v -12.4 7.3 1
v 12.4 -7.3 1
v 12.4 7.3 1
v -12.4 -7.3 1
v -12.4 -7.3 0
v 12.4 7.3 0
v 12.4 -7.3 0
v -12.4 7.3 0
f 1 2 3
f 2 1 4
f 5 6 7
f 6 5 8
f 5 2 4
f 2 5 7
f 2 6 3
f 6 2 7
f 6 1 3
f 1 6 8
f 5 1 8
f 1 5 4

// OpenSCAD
$fn = 64;

// Target PCB dimensions (mm)
pcb_length    = 24.8;
pcb_width     = 14.6;
pcb_thickness = 1.0;

// One connected solid: simple rectangular PCB.
// Centered in X/Y, with bottom face on Z=0.
module pcb(len, wid, thk) {
    translate([0, 0, thk/2])
        cube([len, wid, thk], center=true);
}

color([0.0, 0.4, 0.2]) pcb(pcb_length, pcb_width, pcb_thickness);
